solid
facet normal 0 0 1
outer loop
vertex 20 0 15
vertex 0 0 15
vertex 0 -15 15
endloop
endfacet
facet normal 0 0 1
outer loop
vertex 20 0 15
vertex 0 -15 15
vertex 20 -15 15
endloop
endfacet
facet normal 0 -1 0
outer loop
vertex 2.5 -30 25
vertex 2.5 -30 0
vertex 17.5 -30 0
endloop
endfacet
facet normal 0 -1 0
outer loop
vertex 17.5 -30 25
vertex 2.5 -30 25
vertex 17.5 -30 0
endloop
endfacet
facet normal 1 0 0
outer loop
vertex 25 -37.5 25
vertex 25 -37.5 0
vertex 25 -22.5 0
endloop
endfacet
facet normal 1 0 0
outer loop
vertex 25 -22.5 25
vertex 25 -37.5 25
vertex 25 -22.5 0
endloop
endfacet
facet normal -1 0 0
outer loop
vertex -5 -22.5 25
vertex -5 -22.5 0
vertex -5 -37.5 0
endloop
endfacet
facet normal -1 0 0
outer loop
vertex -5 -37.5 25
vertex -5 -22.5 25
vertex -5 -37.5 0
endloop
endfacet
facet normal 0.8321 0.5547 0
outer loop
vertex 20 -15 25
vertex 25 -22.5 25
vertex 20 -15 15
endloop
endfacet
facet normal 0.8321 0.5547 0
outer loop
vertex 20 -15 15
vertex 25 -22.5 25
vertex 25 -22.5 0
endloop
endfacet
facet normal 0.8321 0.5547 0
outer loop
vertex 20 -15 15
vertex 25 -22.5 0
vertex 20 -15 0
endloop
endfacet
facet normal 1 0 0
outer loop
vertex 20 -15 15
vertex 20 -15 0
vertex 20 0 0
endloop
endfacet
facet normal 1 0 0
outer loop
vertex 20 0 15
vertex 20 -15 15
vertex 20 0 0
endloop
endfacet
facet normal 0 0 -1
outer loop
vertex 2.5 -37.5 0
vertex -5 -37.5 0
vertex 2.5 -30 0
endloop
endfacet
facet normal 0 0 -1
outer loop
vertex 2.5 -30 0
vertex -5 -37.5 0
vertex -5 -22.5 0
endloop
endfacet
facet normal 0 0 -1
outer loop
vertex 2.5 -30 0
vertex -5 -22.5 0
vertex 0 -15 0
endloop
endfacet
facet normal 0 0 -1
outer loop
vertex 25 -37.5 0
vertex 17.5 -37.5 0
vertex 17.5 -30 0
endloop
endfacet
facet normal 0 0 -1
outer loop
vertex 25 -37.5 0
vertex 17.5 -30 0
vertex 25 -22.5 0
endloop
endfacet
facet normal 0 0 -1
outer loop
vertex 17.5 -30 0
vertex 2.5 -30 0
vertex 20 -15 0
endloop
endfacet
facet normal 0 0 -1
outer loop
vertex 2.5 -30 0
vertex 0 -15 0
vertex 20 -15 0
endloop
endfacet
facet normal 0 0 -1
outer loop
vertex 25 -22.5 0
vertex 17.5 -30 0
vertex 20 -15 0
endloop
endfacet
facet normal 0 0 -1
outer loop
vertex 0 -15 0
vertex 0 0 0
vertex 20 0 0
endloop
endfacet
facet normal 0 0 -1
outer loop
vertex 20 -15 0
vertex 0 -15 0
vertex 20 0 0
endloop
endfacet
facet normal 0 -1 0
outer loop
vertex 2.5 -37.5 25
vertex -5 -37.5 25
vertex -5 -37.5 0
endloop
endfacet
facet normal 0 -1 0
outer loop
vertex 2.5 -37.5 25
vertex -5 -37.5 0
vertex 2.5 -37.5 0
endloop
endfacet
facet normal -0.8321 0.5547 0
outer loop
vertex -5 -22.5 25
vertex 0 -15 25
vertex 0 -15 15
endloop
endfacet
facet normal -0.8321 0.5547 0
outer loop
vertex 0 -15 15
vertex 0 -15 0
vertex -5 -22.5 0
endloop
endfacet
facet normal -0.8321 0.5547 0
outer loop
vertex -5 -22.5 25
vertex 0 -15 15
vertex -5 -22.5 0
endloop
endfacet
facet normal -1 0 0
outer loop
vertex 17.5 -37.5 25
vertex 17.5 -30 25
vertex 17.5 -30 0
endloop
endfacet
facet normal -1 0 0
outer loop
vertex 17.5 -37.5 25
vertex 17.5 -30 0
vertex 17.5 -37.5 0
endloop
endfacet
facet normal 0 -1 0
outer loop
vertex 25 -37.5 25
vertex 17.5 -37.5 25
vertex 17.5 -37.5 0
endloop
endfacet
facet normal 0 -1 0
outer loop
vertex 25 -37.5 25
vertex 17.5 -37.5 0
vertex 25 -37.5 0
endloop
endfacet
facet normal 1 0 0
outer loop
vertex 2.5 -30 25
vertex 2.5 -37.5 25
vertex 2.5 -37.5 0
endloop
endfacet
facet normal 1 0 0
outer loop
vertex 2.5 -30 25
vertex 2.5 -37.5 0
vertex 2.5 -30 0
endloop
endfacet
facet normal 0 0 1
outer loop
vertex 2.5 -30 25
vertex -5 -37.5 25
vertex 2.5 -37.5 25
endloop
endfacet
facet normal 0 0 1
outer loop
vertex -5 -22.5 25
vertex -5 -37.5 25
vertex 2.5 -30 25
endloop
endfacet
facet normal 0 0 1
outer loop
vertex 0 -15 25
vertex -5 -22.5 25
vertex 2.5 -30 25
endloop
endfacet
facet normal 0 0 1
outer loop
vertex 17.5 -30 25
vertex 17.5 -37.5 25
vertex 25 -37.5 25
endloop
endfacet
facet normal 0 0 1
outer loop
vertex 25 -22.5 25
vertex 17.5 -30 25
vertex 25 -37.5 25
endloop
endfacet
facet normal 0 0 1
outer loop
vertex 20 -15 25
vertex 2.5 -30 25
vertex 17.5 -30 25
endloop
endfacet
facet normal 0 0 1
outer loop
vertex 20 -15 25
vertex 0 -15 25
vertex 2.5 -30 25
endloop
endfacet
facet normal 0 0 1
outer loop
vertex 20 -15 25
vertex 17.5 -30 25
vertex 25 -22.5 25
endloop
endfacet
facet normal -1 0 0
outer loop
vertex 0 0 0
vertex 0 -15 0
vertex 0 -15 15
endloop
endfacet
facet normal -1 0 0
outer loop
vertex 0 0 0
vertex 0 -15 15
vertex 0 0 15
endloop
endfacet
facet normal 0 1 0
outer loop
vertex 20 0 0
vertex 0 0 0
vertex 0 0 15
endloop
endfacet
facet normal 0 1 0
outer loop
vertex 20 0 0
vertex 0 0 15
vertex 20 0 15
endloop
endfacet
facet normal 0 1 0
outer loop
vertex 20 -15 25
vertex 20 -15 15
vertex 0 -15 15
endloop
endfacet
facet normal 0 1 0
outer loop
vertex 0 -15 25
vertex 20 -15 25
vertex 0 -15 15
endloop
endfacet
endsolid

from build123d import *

# Parameters (mm, degrees)
F0_W     = 20
F0_H     = 15
F1_DEPTH = 15
F2_DEPTH = 25


with BuildPart() as f1:
    # F0 (on Top) → F1 (new body)
    with BuildSketch(Plane.XY):
        with Locations((10, -7.5)):
            Rectangle(F0_W, F0_H)
    extrude(amount=F1_DEPTH)

    # F0 (on Top) → F2 (join)
    with BuildSketch(Plane.XY):
        Polygon((20, -15), (0, -15), (-5, -22.5), (-5, -37.5), (2.5, -37.5), (2.5, -30), (17.5, -30), (17.5, -37.5), (25, -37.5), (25, -22.5), align=None)
    extrude(amount=F2_DEPTH)


solid = f1.part
